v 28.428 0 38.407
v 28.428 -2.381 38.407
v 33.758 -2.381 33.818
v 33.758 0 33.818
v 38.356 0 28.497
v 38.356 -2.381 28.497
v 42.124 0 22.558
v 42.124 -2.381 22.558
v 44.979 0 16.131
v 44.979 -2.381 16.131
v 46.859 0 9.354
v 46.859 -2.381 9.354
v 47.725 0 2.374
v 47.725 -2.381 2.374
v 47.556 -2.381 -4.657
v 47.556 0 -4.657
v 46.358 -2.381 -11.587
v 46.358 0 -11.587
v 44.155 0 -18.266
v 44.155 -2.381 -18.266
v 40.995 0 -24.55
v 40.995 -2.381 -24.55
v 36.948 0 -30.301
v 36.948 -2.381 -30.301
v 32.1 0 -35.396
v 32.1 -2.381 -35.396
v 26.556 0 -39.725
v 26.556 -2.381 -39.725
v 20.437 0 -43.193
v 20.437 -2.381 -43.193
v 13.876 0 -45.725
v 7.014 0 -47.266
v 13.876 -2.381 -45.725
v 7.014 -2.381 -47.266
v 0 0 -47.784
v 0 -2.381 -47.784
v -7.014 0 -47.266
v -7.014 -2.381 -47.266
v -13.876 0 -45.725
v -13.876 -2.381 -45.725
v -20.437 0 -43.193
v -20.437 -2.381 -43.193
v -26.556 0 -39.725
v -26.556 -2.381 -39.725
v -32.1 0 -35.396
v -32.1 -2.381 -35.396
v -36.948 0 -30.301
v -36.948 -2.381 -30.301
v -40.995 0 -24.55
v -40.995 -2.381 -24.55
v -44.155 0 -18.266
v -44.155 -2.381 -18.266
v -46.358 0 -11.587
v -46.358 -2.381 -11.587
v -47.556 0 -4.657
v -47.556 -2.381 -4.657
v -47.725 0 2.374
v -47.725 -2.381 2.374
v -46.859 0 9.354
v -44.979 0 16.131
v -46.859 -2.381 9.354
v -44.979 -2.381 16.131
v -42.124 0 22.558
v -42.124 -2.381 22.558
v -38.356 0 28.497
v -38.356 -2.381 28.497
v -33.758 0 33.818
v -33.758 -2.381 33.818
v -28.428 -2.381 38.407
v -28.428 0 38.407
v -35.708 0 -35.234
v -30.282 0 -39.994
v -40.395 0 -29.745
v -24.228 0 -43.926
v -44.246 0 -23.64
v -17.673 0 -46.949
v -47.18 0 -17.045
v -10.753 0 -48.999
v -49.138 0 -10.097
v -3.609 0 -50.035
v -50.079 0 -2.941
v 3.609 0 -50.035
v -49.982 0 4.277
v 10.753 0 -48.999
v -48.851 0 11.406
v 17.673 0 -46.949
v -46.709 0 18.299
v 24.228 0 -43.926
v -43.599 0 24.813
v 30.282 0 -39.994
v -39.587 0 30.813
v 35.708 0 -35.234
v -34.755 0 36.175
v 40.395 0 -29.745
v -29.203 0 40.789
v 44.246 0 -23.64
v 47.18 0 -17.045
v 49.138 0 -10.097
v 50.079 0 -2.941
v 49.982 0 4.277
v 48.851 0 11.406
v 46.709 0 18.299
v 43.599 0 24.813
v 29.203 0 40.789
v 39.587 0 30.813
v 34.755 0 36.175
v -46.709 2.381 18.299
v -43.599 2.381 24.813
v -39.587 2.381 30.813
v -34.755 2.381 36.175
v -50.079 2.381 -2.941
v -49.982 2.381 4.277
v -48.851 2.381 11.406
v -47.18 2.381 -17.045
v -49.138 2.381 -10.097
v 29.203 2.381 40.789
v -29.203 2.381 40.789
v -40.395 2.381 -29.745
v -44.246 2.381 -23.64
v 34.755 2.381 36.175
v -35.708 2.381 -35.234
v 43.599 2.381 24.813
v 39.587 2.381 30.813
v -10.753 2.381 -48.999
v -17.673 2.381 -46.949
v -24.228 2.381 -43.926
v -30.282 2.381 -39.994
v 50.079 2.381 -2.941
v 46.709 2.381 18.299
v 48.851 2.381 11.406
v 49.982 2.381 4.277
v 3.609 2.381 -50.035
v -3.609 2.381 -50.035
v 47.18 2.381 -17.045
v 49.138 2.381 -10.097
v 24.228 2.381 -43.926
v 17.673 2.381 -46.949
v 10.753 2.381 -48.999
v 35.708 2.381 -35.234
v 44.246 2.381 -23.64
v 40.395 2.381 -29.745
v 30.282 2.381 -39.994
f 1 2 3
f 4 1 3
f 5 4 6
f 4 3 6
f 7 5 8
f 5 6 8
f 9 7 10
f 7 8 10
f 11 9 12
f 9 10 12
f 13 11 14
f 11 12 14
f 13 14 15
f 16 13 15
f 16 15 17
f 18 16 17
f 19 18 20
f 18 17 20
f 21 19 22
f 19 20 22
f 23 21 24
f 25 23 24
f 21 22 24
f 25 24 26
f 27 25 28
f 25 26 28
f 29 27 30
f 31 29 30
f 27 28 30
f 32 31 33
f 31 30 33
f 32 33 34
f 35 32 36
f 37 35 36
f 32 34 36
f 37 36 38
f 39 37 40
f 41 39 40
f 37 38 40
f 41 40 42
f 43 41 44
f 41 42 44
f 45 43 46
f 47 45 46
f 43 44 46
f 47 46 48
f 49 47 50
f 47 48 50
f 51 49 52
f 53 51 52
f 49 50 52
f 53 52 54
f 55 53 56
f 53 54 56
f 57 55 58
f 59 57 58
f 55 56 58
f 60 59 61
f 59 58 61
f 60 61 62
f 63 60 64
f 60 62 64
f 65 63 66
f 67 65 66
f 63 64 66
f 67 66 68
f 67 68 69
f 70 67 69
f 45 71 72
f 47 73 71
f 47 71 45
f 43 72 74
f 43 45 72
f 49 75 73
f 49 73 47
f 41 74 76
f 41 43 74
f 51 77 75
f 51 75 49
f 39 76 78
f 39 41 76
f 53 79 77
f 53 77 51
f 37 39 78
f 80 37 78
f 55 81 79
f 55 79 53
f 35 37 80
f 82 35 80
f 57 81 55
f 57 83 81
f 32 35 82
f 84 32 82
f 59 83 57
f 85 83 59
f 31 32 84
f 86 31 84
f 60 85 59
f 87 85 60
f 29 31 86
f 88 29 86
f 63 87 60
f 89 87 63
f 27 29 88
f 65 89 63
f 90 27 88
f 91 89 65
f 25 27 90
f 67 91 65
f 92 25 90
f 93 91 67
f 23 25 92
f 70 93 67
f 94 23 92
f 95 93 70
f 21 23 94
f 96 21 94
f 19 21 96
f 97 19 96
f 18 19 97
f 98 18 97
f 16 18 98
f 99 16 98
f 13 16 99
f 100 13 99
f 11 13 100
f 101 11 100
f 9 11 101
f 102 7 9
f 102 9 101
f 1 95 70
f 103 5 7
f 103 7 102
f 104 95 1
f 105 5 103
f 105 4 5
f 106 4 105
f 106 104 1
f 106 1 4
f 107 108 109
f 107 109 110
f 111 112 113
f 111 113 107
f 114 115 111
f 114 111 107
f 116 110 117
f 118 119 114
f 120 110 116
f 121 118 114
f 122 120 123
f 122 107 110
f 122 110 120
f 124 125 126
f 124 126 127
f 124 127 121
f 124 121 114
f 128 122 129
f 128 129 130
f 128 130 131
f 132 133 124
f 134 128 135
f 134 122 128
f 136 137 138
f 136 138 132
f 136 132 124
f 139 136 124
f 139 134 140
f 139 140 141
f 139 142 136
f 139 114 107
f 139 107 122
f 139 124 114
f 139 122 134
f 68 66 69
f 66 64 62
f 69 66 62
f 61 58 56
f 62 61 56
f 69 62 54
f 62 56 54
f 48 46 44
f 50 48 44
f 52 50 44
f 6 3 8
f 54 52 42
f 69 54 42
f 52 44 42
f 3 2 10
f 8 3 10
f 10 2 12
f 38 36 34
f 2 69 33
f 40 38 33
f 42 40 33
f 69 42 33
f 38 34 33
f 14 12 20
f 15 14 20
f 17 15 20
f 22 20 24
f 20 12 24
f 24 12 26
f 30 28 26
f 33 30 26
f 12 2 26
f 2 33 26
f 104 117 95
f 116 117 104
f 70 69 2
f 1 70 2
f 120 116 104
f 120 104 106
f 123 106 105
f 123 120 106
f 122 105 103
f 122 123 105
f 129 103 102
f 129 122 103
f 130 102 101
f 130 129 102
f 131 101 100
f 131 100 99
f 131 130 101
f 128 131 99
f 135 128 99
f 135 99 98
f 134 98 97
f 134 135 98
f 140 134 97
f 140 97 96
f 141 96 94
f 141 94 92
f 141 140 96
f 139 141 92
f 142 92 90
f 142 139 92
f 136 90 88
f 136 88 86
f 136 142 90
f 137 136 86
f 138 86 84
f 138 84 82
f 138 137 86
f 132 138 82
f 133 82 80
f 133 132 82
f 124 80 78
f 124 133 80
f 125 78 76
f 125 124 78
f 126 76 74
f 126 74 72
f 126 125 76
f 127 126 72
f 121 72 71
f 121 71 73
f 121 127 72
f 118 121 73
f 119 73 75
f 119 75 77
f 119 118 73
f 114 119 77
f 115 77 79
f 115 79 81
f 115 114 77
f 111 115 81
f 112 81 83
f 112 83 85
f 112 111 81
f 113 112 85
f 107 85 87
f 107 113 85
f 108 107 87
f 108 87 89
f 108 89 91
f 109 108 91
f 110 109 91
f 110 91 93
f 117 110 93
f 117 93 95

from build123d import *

# Parameters (mm, degrees)
BOSS_EXTRUDE1_DEPTH = 2.38125
SKETCH3_OUTSIDE_W   = 129.43
SKETCH3_OUTSIDE_H   = 120.054
CUT_EXTRUDE1_DEPTH  = 2.38125


with BuildPart() as part:
    # Sketch2 → Boss-Extrude1 (new, symmetric)
    with BuildSketch(Plane(origin=(0, 0, 0), x_dir=(1, 0, 0), z_dir=(0, 1, 0))):
        with BuildLine():
            Line((-29.2030912, -40.788560766), (29.2030912, -40.788560766))
            ThreePointArc((29.2030912, -40.788560766), (0, 50.165), (-29.2030912, -40.788560766))
        make_face()
    extrude(amount=BOSS_EXTRUDE1_DEPTH, both=True)

    # Sketch3 outside → Cut-Extrude1 (cut)
    with BuildSketch(Plane.XZ.offset(2.38125)):
        with Locations((0, -4.688)):
            Rectangle(SKETCH3_OUTSIDE_W, SKETCH3_OUTSIDE_H)
        with BuildLine():
            Line((-28.428247287, 38.407310766), (28.428247287, 38.407310766))
            ThreePointArc((28.428247287, 38.407310766), (0, -47.78375), (-28.428247287, 38.407310766))
        make_face(mode=Mode.SUBTRACT)
    extrude(amount=-CUT_EXTRUDE1_DEPTH, mode=Mode.SUBTRACT)


solid = part.part
